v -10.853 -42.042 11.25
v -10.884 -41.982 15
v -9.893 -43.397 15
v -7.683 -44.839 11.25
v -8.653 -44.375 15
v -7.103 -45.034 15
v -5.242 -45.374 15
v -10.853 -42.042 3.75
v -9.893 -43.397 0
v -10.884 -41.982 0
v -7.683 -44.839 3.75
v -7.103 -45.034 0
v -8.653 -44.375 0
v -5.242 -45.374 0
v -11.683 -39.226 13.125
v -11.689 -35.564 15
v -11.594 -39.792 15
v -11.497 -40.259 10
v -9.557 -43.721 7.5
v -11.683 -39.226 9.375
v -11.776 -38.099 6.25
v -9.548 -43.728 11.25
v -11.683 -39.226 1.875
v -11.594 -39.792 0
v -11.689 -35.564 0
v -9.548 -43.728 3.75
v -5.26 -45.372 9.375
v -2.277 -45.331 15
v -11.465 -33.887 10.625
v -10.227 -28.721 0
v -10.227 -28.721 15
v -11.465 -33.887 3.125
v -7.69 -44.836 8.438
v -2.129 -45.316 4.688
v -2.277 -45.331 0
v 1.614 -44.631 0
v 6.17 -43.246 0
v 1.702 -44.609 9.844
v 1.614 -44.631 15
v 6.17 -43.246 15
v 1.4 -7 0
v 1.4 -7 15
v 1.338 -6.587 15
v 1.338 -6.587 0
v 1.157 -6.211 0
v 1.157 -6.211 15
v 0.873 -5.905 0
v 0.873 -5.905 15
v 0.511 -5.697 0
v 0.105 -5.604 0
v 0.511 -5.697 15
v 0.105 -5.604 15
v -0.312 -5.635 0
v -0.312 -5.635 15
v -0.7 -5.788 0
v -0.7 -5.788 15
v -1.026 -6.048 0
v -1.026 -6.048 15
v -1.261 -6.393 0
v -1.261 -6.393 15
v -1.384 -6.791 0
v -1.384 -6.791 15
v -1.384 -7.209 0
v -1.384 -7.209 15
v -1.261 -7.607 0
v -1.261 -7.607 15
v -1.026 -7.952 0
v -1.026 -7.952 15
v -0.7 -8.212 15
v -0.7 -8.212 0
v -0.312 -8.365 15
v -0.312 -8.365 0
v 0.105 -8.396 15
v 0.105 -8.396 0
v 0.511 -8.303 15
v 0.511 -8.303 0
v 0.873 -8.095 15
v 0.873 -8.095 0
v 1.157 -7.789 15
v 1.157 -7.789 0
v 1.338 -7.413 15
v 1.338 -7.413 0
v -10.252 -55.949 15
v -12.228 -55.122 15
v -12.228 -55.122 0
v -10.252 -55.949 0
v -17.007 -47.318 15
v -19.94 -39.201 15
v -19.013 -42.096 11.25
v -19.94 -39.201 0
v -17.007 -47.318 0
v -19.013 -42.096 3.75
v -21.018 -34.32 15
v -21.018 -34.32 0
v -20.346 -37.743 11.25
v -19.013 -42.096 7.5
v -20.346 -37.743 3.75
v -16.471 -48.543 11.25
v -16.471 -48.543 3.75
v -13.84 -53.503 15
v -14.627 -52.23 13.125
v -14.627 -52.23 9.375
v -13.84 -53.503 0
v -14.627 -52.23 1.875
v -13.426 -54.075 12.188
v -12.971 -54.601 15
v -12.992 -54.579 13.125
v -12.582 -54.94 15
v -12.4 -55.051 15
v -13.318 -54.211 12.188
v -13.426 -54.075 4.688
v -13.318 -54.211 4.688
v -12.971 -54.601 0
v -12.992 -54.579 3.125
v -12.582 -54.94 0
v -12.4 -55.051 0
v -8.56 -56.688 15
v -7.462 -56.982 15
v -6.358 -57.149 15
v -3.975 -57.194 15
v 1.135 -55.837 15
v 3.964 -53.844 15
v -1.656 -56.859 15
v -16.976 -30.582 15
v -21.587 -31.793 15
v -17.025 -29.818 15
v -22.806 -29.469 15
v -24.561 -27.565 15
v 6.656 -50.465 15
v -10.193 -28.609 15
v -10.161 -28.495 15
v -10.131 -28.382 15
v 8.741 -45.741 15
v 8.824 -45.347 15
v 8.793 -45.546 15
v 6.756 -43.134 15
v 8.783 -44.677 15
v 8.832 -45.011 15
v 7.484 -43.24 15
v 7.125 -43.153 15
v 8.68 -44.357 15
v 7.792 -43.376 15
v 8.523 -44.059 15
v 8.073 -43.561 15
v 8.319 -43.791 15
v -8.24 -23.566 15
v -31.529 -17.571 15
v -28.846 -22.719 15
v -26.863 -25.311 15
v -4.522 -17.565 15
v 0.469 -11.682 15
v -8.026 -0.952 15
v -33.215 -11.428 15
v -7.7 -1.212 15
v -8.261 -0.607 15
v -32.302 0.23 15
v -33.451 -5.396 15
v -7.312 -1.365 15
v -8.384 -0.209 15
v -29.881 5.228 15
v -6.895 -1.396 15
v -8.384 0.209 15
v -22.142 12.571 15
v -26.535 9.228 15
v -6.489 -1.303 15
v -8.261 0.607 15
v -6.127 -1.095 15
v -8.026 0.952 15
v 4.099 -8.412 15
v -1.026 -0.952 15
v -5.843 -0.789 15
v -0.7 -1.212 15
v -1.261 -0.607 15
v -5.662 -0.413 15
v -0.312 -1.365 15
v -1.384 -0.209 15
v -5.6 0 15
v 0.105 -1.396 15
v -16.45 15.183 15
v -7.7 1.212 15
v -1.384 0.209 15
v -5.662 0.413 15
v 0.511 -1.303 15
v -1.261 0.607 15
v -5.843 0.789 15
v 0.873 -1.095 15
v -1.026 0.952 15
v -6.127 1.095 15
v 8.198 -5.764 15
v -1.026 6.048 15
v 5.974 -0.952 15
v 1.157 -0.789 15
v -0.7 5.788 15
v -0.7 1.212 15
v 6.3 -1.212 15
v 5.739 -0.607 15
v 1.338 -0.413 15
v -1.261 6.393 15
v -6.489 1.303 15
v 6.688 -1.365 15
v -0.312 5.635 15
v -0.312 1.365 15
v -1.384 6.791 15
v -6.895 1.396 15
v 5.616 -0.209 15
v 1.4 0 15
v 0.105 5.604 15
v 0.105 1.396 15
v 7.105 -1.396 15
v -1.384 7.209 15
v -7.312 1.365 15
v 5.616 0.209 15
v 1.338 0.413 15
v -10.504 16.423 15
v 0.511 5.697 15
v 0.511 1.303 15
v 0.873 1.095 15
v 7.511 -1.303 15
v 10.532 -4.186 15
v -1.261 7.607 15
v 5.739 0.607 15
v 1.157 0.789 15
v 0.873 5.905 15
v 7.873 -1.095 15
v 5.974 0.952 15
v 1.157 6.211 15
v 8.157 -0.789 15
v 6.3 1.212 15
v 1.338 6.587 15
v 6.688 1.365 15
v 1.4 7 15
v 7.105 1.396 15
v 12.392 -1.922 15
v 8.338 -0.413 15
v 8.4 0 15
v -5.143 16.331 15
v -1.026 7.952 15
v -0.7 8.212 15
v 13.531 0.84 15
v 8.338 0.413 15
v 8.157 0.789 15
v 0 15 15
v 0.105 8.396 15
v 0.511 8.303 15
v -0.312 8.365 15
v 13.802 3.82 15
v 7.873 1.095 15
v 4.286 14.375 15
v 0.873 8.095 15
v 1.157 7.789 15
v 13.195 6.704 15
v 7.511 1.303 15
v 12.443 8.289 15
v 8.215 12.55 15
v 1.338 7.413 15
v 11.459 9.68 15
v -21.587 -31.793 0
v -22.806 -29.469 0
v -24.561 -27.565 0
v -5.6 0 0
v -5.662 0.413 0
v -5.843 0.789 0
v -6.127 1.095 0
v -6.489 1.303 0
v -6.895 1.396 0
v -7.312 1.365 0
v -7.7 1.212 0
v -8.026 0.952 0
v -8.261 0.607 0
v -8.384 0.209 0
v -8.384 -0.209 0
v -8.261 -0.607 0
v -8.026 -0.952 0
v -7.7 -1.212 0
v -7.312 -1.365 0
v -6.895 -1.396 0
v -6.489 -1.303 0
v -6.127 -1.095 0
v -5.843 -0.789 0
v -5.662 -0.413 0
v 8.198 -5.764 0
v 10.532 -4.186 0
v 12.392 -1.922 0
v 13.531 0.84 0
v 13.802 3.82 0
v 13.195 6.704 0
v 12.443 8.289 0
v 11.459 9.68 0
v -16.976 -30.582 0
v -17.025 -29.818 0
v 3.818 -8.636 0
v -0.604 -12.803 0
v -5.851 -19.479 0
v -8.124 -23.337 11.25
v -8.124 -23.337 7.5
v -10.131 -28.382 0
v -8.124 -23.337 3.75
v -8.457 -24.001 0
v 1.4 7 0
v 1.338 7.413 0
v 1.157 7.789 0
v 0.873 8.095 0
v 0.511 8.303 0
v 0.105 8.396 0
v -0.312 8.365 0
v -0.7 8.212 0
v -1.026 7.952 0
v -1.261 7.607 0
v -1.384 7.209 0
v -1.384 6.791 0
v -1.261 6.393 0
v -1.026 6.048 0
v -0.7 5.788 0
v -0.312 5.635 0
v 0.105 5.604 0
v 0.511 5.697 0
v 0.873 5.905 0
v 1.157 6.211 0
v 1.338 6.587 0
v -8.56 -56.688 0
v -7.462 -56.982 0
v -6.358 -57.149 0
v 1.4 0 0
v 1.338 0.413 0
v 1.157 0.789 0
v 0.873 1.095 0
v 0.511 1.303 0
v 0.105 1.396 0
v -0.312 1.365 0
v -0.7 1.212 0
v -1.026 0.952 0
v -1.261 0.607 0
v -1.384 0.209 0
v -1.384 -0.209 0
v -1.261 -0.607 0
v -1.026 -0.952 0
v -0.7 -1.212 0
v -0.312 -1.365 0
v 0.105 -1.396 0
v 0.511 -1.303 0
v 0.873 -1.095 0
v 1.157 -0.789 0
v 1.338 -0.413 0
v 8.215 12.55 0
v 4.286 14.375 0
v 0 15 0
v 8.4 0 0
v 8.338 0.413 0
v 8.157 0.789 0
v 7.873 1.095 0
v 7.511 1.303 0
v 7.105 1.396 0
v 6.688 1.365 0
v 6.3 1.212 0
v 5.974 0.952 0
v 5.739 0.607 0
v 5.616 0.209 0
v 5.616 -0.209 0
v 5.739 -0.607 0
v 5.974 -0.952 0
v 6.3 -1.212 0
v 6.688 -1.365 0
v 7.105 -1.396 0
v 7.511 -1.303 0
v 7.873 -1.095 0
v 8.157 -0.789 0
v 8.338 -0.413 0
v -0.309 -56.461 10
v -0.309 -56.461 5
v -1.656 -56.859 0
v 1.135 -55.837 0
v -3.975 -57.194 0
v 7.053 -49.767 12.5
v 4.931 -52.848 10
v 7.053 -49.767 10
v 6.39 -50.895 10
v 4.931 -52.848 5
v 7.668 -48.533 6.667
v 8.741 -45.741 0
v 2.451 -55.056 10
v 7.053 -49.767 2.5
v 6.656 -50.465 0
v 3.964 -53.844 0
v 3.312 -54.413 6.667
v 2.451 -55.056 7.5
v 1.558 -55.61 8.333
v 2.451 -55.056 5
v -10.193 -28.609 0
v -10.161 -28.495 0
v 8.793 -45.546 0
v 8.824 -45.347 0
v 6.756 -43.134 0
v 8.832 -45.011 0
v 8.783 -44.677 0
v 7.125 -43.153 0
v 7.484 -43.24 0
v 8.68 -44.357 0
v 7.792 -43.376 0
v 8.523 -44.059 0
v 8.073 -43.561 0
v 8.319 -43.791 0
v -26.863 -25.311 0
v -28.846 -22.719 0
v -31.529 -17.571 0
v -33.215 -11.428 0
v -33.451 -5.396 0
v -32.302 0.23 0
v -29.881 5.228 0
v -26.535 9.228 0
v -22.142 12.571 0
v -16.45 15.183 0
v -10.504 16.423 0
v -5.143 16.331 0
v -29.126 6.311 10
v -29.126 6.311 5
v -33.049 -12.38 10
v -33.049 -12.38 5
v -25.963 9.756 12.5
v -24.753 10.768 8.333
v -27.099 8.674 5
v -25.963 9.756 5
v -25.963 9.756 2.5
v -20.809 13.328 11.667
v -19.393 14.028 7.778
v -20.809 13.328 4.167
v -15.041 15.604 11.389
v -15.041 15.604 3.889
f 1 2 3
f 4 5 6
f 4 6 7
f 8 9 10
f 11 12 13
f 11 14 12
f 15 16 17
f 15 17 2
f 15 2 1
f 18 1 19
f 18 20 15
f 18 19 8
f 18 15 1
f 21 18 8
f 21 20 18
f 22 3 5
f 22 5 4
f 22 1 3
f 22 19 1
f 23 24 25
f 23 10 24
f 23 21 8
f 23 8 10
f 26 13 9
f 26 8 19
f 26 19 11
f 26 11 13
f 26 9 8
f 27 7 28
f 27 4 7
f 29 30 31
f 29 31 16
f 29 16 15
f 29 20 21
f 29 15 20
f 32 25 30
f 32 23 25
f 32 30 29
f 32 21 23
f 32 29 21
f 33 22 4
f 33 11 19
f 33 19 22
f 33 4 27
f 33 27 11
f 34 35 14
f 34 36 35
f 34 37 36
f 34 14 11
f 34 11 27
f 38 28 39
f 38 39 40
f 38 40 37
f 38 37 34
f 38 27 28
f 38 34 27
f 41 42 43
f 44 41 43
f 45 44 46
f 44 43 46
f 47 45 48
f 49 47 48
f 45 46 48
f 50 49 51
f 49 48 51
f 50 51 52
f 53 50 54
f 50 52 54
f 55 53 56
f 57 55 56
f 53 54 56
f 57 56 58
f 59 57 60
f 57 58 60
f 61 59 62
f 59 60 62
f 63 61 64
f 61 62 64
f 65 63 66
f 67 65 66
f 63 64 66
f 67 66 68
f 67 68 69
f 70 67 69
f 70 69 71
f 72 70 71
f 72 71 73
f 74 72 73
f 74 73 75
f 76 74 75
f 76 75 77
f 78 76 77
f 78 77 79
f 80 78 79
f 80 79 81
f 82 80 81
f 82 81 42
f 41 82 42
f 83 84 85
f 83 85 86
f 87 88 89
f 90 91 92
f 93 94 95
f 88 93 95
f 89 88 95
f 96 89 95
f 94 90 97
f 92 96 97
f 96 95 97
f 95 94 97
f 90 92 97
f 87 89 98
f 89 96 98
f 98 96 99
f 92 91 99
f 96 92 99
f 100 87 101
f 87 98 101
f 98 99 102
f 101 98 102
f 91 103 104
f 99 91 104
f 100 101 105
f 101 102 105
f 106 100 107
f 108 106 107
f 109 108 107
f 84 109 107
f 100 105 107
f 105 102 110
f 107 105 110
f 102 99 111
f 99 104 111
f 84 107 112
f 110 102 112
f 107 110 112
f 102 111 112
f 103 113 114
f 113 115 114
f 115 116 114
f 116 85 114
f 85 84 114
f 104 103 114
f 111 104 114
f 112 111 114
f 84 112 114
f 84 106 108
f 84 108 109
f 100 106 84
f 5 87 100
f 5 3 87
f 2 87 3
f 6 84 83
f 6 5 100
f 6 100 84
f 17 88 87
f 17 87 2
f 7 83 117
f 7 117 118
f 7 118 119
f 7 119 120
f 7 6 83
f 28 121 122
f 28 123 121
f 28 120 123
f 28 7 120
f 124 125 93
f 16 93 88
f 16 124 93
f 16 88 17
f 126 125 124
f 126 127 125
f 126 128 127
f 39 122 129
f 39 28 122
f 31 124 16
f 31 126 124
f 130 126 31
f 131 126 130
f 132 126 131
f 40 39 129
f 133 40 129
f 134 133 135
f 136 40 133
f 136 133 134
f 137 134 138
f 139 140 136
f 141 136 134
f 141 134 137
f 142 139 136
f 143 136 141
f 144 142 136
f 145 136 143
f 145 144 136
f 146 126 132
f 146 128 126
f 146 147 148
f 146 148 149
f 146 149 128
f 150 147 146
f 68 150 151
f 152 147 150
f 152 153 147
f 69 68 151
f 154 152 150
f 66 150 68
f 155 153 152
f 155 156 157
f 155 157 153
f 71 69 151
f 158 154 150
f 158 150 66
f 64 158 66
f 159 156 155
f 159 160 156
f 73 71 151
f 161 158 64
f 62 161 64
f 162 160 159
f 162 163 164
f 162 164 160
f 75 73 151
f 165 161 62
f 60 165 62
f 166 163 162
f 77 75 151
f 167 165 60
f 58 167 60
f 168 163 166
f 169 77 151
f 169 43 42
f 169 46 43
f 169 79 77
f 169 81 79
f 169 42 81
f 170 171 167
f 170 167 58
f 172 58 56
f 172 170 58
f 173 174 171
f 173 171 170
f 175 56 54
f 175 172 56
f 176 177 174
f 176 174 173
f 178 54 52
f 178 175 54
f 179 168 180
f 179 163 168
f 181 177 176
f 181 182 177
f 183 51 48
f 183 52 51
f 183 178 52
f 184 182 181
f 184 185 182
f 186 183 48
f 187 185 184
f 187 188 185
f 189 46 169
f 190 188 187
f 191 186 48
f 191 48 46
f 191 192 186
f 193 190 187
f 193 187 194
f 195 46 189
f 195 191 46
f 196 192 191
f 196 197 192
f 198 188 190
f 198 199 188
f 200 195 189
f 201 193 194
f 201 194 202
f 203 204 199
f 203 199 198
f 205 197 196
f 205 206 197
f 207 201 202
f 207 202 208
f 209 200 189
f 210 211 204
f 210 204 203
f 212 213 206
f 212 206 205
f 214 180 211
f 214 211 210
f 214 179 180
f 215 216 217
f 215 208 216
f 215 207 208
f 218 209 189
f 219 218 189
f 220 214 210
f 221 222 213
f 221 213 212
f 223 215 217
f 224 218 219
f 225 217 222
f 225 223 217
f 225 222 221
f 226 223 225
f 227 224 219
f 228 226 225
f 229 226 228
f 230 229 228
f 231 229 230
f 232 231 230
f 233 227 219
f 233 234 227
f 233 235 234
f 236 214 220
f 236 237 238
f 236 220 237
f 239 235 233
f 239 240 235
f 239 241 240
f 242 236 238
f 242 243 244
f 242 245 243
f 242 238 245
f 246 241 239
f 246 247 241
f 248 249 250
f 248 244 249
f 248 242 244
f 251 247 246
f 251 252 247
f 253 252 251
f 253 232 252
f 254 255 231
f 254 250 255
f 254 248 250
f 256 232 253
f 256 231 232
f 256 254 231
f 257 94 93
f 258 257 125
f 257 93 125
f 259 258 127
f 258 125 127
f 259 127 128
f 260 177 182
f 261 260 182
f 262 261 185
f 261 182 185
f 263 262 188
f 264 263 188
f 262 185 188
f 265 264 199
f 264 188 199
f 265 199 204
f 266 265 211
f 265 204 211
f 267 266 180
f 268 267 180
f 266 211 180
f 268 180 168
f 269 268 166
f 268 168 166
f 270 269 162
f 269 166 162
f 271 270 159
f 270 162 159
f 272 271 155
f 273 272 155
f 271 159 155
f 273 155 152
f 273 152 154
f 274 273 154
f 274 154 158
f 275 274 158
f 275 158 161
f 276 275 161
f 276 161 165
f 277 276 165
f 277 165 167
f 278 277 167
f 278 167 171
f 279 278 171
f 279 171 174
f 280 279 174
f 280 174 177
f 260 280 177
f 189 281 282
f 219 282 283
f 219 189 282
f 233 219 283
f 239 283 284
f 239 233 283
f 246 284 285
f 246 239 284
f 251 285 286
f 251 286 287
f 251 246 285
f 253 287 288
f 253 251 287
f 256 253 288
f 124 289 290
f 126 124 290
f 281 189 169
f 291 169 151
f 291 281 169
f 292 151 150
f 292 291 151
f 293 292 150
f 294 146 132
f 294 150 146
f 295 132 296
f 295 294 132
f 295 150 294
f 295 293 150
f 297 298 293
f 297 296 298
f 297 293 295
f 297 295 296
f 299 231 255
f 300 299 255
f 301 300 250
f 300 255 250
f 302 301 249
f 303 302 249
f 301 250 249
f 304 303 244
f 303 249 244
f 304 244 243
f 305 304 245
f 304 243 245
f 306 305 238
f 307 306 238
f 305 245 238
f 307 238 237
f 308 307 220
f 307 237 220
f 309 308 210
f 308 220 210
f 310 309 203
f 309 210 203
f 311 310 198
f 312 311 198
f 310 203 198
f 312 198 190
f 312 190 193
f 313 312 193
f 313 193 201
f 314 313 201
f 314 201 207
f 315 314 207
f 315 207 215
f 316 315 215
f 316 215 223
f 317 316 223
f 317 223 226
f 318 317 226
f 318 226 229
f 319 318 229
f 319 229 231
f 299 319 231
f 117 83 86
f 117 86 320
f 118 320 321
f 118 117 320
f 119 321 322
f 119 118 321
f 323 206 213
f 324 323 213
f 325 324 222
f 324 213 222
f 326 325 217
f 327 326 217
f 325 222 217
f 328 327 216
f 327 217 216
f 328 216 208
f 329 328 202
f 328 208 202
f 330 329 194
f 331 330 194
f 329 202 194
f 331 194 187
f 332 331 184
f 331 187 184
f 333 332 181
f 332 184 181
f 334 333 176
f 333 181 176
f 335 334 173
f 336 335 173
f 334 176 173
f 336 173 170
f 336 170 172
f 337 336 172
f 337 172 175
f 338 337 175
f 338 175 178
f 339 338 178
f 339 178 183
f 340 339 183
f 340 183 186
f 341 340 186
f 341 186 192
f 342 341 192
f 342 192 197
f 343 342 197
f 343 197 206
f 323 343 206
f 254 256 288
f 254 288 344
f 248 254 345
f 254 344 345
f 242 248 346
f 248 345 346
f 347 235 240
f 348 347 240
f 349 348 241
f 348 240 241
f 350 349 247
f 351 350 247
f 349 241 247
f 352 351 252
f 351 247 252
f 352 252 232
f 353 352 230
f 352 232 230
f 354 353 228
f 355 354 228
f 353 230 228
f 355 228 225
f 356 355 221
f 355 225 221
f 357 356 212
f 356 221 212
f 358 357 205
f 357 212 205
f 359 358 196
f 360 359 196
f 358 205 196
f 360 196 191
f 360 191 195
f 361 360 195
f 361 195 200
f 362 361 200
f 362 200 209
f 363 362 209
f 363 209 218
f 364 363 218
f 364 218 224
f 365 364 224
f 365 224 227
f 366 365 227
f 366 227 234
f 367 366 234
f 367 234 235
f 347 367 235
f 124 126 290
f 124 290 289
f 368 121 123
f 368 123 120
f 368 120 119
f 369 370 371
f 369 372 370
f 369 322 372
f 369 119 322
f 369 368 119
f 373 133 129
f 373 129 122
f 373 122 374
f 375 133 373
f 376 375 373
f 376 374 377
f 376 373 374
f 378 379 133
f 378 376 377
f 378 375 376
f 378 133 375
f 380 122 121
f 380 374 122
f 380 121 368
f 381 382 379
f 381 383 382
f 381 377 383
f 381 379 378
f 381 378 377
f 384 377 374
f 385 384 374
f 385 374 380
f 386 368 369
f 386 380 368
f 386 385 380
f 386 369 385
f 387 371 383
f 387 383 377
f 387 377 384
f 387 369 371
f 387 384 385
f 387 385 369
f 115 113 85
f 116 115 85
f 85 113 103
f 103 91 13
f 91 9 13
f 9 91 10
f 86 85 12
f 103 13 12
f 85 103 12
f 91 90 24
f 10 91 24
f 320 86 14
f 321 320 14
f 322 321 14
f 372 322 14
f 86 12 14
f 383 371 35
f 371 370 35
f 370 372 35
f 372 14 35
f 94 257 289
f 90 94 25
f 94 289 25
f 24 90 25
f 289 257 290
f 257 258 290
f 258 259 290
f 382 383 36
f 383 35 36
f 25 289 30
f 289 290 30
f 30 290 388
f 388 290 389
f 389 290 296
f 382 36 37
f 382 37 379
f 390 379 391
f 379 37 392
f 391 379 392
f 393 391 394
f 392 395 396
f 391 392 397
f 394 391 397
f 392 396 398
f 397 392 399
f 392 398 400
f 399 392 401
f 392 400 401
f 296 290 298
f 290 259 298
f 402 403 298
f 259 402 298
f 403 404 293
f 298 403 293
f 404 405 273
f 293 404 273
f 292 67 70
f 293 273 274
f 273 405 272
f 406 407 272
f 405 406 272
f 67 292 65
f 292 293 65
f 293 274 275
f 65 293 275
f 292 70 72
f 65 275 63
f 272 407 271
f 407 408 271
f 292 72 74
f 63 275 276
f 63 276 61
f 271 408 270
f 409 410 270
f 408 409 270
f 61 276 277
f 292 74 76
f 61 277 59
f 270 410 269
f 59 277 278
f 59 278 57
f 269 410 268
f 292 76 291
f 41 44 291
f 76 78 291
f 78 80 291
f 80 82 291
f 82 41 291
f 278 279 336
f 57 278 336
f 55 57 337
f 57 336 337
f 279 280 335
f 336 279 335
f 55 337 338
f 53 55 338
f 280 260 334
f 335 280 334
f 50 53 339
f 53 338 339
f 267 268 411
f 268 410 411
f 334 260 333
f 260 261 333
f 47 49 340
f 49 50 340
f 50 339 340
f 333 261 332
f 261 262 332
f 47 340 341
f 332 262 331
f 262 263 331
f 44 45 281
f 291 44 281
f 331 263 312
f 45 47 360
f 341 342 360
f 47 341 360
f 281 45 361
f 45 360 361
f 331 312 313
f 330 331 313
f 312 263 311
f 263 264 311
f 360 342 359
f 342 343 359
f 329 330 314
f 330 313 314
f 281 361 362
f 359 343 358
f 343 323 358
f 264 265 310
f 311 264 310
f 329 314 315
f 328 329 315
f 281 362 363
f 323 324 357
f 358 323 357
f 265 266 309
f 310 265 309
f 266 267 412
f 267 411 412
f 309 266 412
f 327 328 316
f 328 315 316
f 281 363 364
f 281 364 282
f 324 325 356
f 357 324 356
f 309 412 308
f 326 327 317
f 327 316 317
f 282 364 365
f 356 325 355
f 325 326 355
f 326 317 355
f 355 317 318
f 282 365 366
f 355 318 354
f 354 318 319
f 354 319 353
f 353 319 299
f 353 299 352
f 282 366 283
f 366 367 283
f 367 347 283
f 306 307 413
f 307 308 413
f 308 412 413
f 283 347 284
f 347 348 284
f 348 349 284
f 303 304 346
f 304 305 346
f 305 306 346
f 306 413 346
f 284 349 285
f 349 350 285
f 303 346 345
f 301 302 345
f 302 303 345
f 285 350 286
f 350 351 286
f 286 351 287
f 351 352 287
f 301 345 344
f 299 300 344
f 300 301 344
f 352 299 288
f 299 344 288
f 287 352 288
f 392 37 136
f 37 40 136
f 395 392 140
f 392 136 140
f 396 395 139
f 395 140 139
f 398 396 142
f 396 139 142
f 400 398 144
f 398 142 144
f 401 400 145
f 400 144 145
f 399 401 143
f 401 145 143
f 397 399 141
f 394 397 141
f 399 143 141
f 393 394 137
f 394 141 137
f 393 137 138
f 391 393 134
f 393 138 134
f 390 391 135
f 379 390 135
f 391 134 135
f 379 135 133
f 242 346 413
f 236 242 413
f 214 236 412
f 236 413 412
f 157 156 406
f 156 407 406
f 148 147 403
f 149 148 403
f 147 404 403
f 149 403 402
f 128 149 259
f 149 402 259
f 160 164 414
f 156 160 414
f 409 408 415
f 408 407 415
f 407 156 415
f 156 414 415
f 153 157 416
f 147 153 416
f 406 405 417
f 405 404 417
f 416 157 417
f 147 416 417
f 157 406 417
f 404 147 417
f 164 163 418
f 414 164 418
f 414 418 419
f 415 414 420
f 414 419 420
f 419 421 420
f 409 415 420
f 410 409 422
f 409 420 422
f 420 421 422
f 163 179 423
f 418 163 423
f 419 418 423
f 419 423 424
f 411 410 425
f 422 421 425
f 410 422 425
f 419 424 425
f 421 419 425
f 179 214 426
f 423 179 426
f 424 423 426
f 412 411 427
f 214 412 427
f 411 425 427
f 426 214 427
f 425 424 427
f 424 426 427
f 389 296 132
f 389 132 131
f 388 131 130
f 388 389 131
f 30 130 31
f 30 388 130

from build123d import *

# Parameters (mm, degrees)
EXTRUDE_1_DEPTH     = 15
SKETCH_3_R          = 1.4
CUT_EXTRUDE_2_DEPTH = 45.491091955
CUT_EXTRUDE_3_DEPTH = 45.491091955
EXTRUDE_2_DEPTH     = 15
FILLET_1_R          = 2
FILLET_START        = -1
FILLET_2_DEPTH      = 17
FILLET_3_R          = 10
CUT_EXTRUDE_4_DEPTH = 20
CUT_EXTRUDE_5_DEPTH = 20
EXTRUDE_3_DEPTH     = 15
FILLET_10_DEPTH     = 17
FILLET_10_2_DEPTH   = 15
FILLET_11_R         = 5
FILLET_12_R         = 10
EXTRUDE_4_DEPTH     = 15
FILLET_13_R         = 10


with BuildPart() as part:
    # 草图1 → 凸台-拉伸1 (new body)
    with BuildSketch(Plane.XY):
        with BuildLine():
            ThreePointArc((14.095389312, -5.13030215), (12.287280664, 8.603646545), (0, 15))
            add(Edge.make_bspline(
                [(0, 15), (-0.174596768, 14.999999319), (-0.436611581, 14.999693042), (-0.786186323, 14.998643785), (-1.048915847, 14.997519085), (-1.312216235, 14.99603471), (-1.576228693, 14.994161918), (-1.84109342, 14.991865662), (-2.106949414, 14.989104591), (-2.373934268, 14.985831089), (-2.642183971, 14.981991319), (-2.911832716, 14.977525266), (-3.1830127, 14.972366794), (-3.455853932, 14.966443701), (-3.730484039, 14.959677782), (-4.007028071, 14.9519849), (-4.285608318, 14.943275054), (-4.566344116, 14.933452466), (-4.849351664, 14.922415656), (-5.134743838, 14.910057537), (-5.422630012, 14.896265505), (-5.713115875, 14.880921543), (-6.006303259, 14.863902316), (-6.302289959, 14.84507929), (-6.601169567, 14.824318836), (-6.903031299, 14.801482354), (-7.207959833, 14.776426392), (-7.516035146, 14.749002775), (-7.827332351, 14.719058736), (-8.141921549, 14.686437053), (-8.459867669, 14.650976187), (-8.781230323, 14.612510428), (-9.106063662, 14.570870045), (-9.434416233, 14.525881438), (-9.766330843, 14.477367292), (-10.101844426, 14.425146744), (-10.440987913, 14.36903554), (-10.783786108, 14.30884621), (-11.130257567, 14.244388236), (-11.480414483, 14.175468229), (-11.834262574, 14.101890107), (-12.191800976, 14.023455277), (-12.553022141, 13.939962822), (-12.917911738, 13.851209688), (-13.286448564, 13.756990875), (-13.658604451, 13.657099633), (-14.03434419, 13.551327657), (-14.413625446, 13.439465288), (-14.796398691, 13.321301714), (-15.182607133, 13.196625177), (-15.572186657, 13.065223175), (-15.965065767, 12.926882676), (-16.361165533, 12.781390325), (-16.760399548, 12.62853266), (-17.162673883, 12.468096321), (-17.567887059, 12.299868276), (-17.975930009, 12.12363602), (-18.386686074, 11.939187837), (-18.800030904, 11.746312879), (-19.21583277, 11.544801919), (-19.63395132, 11.334445536), (-20.054242271, 11.115042096), (-20.476539575, 10.886368472), (-20.900723293, 10.648292485), (-21.326461435, 10.400346233), (-21.753514654, 10.143757392), (-22.178049863, 9.87535726), (-22.595959424, 9.592299141), (-23.006858872, 9.296248411), (-23.410215858, 8.987163154), (-23.805723663, 8.665361009), (-24.19302422, 8.331073979), (-24.571782966, 7.984568061), (-24.94166894, 7.626110759), (-25.302360391, 7.255979562), (-25.65354351, 6.874459377), (-25.994913004, 6.481842935), (-26.326172169, 6.078430394), (-26.647033089, 5.664529144), (-26.957216795, 5.240453567), (-27.256453426, 4.80652479), (-27.544482381, 4.363070443), (-27.82105247, 3.910424411), (-28.085922052, 3.448926584), (-28.338859169, 2.978922599), (-28.579641679, 2.500763586), (-28.808057373, 2.014805906), (-29.023904095, 1.521410888), (-29.226989847, 1.020944566), (-29.417132895, 0.513777409), (-29.594161862, 0.000284053), (-29.757915818, -0.519156969), (-29.908244365, -1.044163505), (-30.045007708, -1.574350056), (-30.168076728, -2.109328051), (-30.277333041, -2.648706129), (-30.372669056, -3.192090415), (-30.453988019, -3.739084801), (-30.521204062, -4.289291227), (-30.574242228, -4.842309963), (-30.613038507, -5.39773989), (-30.637539851, -5.955178784), (-30.647704191, -6.514223598), (-30.643500444, -7.074470745), (-30.624908509, -7.63551638), (-30.591919266, -8.196956684), (-30.544534557, -8.758388145), (-30.48276717, -9.319407838), (-30.406640805, -9.879613709), (-30.316190047, -10.438604851), (-30.21146032, -10.995981785), (-30.092507839, -11.551346736), (-29.95939956, -12.104303912), (-29.812213112, -12.654459772), (-29.651036733, -13.201423307), (-29.475969194, -13.744806302), (-29.287119719, -14.284223615), (-29.084607895, -14.819293432), (-28.868563581, -15.349637541), (-28.639126801, -15.874881588), (-28.396447646, -16.394655341), (-28.140686152, -16.908592941), (-27.872012186, -17.416333158), (-27.590605319, -17.917519643), (-27.296654692, -18.411801174), (-26.990358881, -18.898831896), (-26.671925755, -19.378271573), (-26.341572303, -19.849785794), (-25.885480421, -20.467504768), (-25.526267712, -20.917866263), (-25.279466623, -21.21199112)],
                knots=[0, 0, 0, 0, 0.008983592, 0.013481544, 0.017986876, 0.022502032, 0.027029448, 0.031571543, 0.036130722, 0.040709366, 0.045309838, 0.049934477, 0.054585593, 0.059265472, 0.063976367, 0.068720504, 0.073500073, 0.078317234, 0.083174111, 0.088072793, 0.093015336, 0.098003759, 0.103040044, 0.108126138, 0.113263955, 0.118455369, 0.123702222, 0.129006319, 0.134369433, 0.139793302, 0.145279632, 0.150830096, 0.156446337, 0.162129965, 0.167882565, 0.173705688, 0.179600863, 0.185569587, 0.191613334, 0.197733555, 0.203931674, 0.210209093, 0.216567194, 0.223007337, 0.229530862, 0.236139089, 0.242833322, 0.249614847, 0.256484933, 0.263444834, 0.270495789, 0.277639024, 0.284875752, 0.292207171, 0.299634469, 0.307158825, 0.314781404, 0.322503362, 0.330325849, 0.338250002, 0.346276954, 0.354407827, 0.362643738, 0.370985797, 0.379435108, 0.387992769, 0.396619209, 0.405274739, 0.413959558, 0.422673829, 0.431417677, 0.440191194, 0.448994436, 0.457827427, 0.466690157, 0.475582587, 0.484504647, 0.493456237, 0.50243723, 0.511447469, 0.520486775, 0.529554938, 0.538651727, 0.547776885, 0.556930133, 0.566111169, 0.575319669, 0.584555288, 0.593817663, 0.603106409, 0.612421123, 0.621761385, 0.631126755, 0.64051678, 0.649930987, 0.659368891, 0.66882999, 0.678313767, 0.687819694, 0.697347228, 0.706895812, 0.71646488, 0.726053851, 0.735662137, 0.745289135, 0.754934234, 0.764596814, 0.774276244, 0.783971886, 0.793683092, 0.803409207, 0.813149569, 0.822903507, 0.832670344, 0.8424494, 0.852239983, 0.862041401, 0.871852953, 0.881673937, 0.891503642, 0.901341356, 0.911186363, 0.921037943, 0.930895373, 0.940757928, 0.95062488, 0.960495499, 0.970369054, 0.980244811, 1, 1, 1, 1], degree=3))
            add(Edge.make_bspline(
                [(-25.279466623, -21.21199112), (-25.03266702, -21.506118015), (-24.650058643, -21.936850324), (-24.116326131, -22.48889957), (-23.704647777, -22.89139552), (-23.281933222, -23.282038607), (-22.848561661, -23.660506241), (-22.404923763, -24.026490317), (-21.951421131, -24.379697722), (-21.48846567, -24.719850743), (-21.016478952, -25.046687464), (-20.535891561, -25.359962134), (-20.047142425, -25.659445508), (-19.550678137, -25.944925156), (-19.04695226, -26.216205747), (-18.536424623, -26.4731093), (-18.019560603, -26.715475403), (-17.496830406, -26.943161412), (-16.968708336, -27.156042604), (-16.435672059, -27.354012309), (-15.898201862, -27.536982008), (-15.35677991, -27.704881402), (-14.811889501, -27.857658441), (-14.264014323, -27.995279333), (-13.713637708, -28.117728512), (-13.161241887, -28.225008578), (-12.607307258, -28.317140209), (-12.052311649, -28.394162034), (-11.496729594, -28.456130483), (-10.941031611, -28.5031196), (-10.385683496, -28.535220833), (-9.831145623, -28.552542784), (-9.277872252, -28.555210939), (-8.726310862, -28.543367367), (-8.176901485, -28.517170386), (-7.630076062, -28.476794208), (-7.086257816, -28.422428554), (-6.545860639, -28.354278239), (-6.009288499, -28.272562744), (-5.476934872, -28.177515748), (-4.949182183, -28.069384646), (-4.426401286, -27.948430045), (-3.908950946, -27.814925234), (-3.397177365, -27.669155633), (-2.891413716, -27.511418228), (-2.391979716, -27.342020982), (-1.899181211, -27.161282232), (-1.413309805, -26.969530066), (-0.934642496, -26.767101692), (-0.463441361, -26.554342786), (4.6748e-05, -26.331606829), (0.455590466, -26.099254437), (0.902974156, -25.857652676), (1.341998114, -25.607174371), (1.77247875, -25.348197408), (2.194248731, -25.081104026), (2.607157097, -24.806280109), (3.011069352, -24.524114474), (3.405867507, -24.234998154), (3.791450116, -23.939323681), (4.167732256, -23.637484373), (4.534645494, -23.329873622), (4.892137816, -23.016884179), (5.240173528, -22.698907455), (5.578733117, -22.376332816), (5.907813101, -22.049546899), (6.22742583, -21.71893292), (6.537599266, -21.384870008), (6.838376738, -21.047732541), (7.129816662, -20.707889495), (7.411992235, -20.365703811), (7.684991105, -20.021531772), (7.948915008, -19.675722401), (8.20387939, -19.32861687), (8.450012994, -18.980547932), (8.687457427, -18.631839373), (8.916366703, -18.282805481), (9.136906768, -17.933750534), (9.349254998, -17.58496832), (9.553599678, -17.236741672), (9.750139466, -16.889342026), (9.939082834, -16.543029011), (10.120647493, -16.198050057), (10.295059808, -15.854640037), (10.462554187, -15.513020927), (10.623372469, -15.173401503), (10.777763289, -14.835977057), (10.925981441, -14.50092915), (11.068287227, -14.168425389), (11.204945795, -13.838619231), (11.336226478, -13.511649827), (11.462402118, -13.187641886), (11.583748391, -12.866705573), (11.70054313, -12.548936438), (11.813065642, -12.234415378), (11.921596028, -11.923208621), (12.026414502, -11.615367753), (12.127800711, -11.310929767), (12.226033064, -11.009917143), (12.321388061, -10.712337965), (12.414139626, -10.418186058), (12.504558455, -10.127441167), (12.592911364, -9.840069152), (12.679460654, -9.556022225), (12.76446348, -9.275239204), (12.848171238, -8.997645806), (12.93082896, -8.723154954), (13.01267473, -8.451667126), (13.093939106, -8.183070715), (13.174844564, -7.917242422), (13.255604965, -7.654047671), (13.336425025, -7.393341046), (13.417499824, -7.134966749), (13.49901432, -6.87875908), (13.581142893, -6.624542932), (13.664048917, -6.372134315), (13.747884322, -6.121340875), (13.832789331, -5.871962488), (13.947500586, -5.541332702), (14.035654827, -5.294414261), (14.095389312, -5.13030215)],
                knots=[0, 0, 0, 0, 0.021270399, 0.031903677, 0.042534645, 0.053162531, 0.063786554, 0.074405932, 0.085019874, 0.095627584, 0.106228257, 0.116821079, 0.127405228, 0.137979868, 0.148544155, 0.15909723, 0.169638222, 0.180166248, 0.190680407, 0.201179787, 0.211663457, 0.222130473, 0.232579872, 0.243010676, 0.253421887, 0.263812492, 0.27418146, 0.284527741, 0.294850266, 0.30514795, 0.315419689, 0.32566436, 0.335880824, 0.346067921, 0.356224476, 0.366349296, 0.376441173, 0.386498878, 0.396521172, 0.406506796, 0.416454478, 0.426362934, 0.436230863, 0.446056956, 0.45583989, 0.465578331, 0.475270938, 0.48491636, 0.49451324, 0.504060215, 0.513555916, 0.522998973, 0.532388013, 0.541721663, 0.550998551, 0.560217309, 0.569376572, 0.578474983, 0.587511192, 0.596483859, 0.605391658, 0.614233274, 0.623007411, 0.631712789, 0.640348151, 0.64891226, 0.657403907, 0.66582191, 0.674165115, 0.682432404, 0.690622694, 0.69873494, 0.706768137, 0.714721328, 0.7225936, 0.730384093, 0.738092, 0.745716573, 0.753257123, 0.760713027, 0.76808373, 0.775368751, 0.782567685, 0.789680206, 0.796706075, 0.803645143, 0.810497353, 0.81726275, 0.823941479, 0.830533798, 0.837040075, 0.8434608, 0.849796585, 0.856048172, 0.86221644, 0.868302406, 0.874307234, 0.880232236, 0.886078882, 0.891848803, 0.897543794, 0.903165817, 0.908717009, 0.914199683, 0.919616328, 0.924969613, 0.930262387, 0.935497677, 0.94067869, 0.945808804, 0.950891568, 0.955930696, 0.960930056, 0.965893662, 0.970825666, 0.975730339, 0.980612064, 0.985475315, 0.990324642, 1, 1, 1, 1], degree=3))
        make_face()
    extrude(amount=EXTRUDE_1_DEPTH)

    # 草图3 → 切除-拉伸2 (cut, through all)
    with BuildSketch(Plane.XY.offset(15)):
        Circle(SKETCH_3_R)
        with Locations((7, 0)):
            Circle(SKETCH_3_R)
        with Locations((0, -7)):
            Circle(SKETCH_3_R)
        with Locations((-7, 0)):
            Circle(SKETCH_3_R)
        with Locations((0, 7)):
            Circle(SKETCH_3_R)
    extrude(amount=-CUT_EXTRUDE_2_DEPTH, mode=Mode.SUBTRACT)

    # 草图4 → 切除-拉伸3 (cut, through all)
    with BuildSketch(Plane(origin=(0, 0, 0), x_dir=(-1, 0, 0), z_dir=(0, 0, -1))):
        with BuildLine():
            add(Edge.make_bspline(
                [(-14.095389312, -5.13030215), (-8.477553271, -2.33145367), (8.442499566, -18.762509722), (12.755936915, -38.178736967), (-14.541457389, -65.503061248), (-22.968832669, -9.551118862), (-14.095389312, -5.13030215)],
                knots=[0, 0, 0, 0, 0.26968314, 0.394975947, 0.574032057, 1, 1, 1, 1], degree=3))
        make_face()
    extrude(amount=-CUT_EXTRUDE_3_DEPTH, mode=Mode.SUBTRACT)

    # 草图5 → 凸台-拉伸2 (add)
    with BuildSketch(Plane(origin=(0, 0, 0), x_dir=(-1, 0, 0), z_dir=(0, 0, -1))):
        with BuildLine():
            add(Edge.make_bspline(
                [(10.171874722, -28.541189548), (17.683846291, -53.151232988), (-9.707997946, -41.889793219)],
                knots=[0, 0, 0, 1, 1, 1], degree=2))
            add(Edge.make_bspline(
                [(-9.707997946, -41.889793219), (-2.463001099, -79.763097153), (48.013392254, -36.744634011), (17.334003198, -27.007773326)],
                knots=[0, 0, 0, 0, 1, 1, 1, 1], degree=3))
            add(Edge.make_bspline(
                [(17.334003198, -27.007773326), (16.861768371, -27.20105705), (16.027625054, -27.506859328), (14.814842143, -27.864848675), (13.716286363, -28.124971876), (12.609659956, -28.324417343), (11.498796153, -28.463423353), (10.685046818, -28.521336018), (10.242958884, -28.538751516), (10.171874722, -28.541189548)],
                knots=[0.183395931, 0.183395931, 0.183395931, 0.183395931, 0.211663457, 0.232579872, 0.253421887, 0.27418146, 0.294850266, 0.315419689, 0.319359962, 0.319359962, 0.319359962, 0.319359962], degree=3))
        make_face()
    extrude(amount=-EXTRUDE_2_DEPTH)

    # 圆角1
    fillet_1_edges = [part.edges().sort_by_distance(p)[0] for p in [
        (9.707997946, -41.889793219, 7.5),
    ]]
    fillet(fillet_1_edges, radius=FILLET_1_R)

    # 圆角2: read off the stored shape, not the designer's step
    # 圆角2 outline → 圆角2 (cut)
    with BuildSketch(Plane.XY.offset(FILLET_START)):
        with BuildLine():
            add(Edge.make_bspline(
                [(-10.171874722, -28.541189548), (-10.158393322, -28.488116713), (-10.144653776, -28.435026787), (-10.130657706, -28.381918891)],
                knots=[0.681495055, 0.681495055, 0.681495055, 0.681495055, 0.683012829, 0.683012829, 0.683012829, 0.683012829], degree=3))
            ThreePointArc((-10.130657706, -28.381918891), (-10.17712039, -28.552114075), (-10.226578366, -28.721463095))
            add(Edge.make_bspline(
                [(-10.171874722, -28.541189548), (-10.199461913, -28.631568216), (-10.226578366, -28.721463095)],
                knots=[0, 0, 0, 0.00367243, 0.00367243, 0.00367243], degree=2))
        make_face()
    extrude(amount=FILLET_2_DEPTH, mode=Mode.SUBTRACT)

    # 圆角3
    fillet_3_edges = [part.edges().sort_by_distance(p)[0] for p in [
        (14.095389312, -5.13030215, 7.5),
    ]]
    fillet(fillet_3_edges, radius=FILLET_3_R)

    # 草图6 → 切除-拉伸4 (cut)
    with BuildSketch(Plane(origin=(0, 0, 0), x_dir=(-1, 0, 0), z_dir=(0, 0, -1))):
        with BuildLine():
            ThreePointArc((17.334004909, -28.838535505), (17.371905963, -27.923154694), (17.334004909, -27.007773884))
            add(Edge.make_bspline(
                [(13.73055902, -54.95243101), (25.941820402, -48.919462484), (34.820440249, -32.557525348), (17.334004909, -27.007773884)],
                knots=[0.430026556, 0.430026556, 0.430026556, 0.430026556, 0.999999963, 0.999999963, 0.999999963, 0.999999963], degree=3))
            add(Edge.make_bspline(
                [(17.334004909, -28.838535505), (28.052279378, -41.223912757), (13.73055902, -54.95243101)],
                knots=[0, 0, 0, 1, 1, 1], degree=2))
        make_face()
    extrude(amount=-CUT_EXTRUDE_4_DEPTH, mode=Mode.SUBTRACT)

    # 草图7 → 切除-拉伸5 (cut)
    with BuildSketch(Plane(origin=(0, 0, 0), x_dir=(-1, 0, 0), z_dir=(0, 0, -1))):
        with BuildLine():
            add(Edge.make_bspline(
                [(17.334004909, -28.838535505), (16.357819767, -30.417478072), (18.89407609, -39.049467108), (16.627660878, -45.968198336), (10.616921472, -60.726222639), (45.520515414, -46.002345599), (19.509062719, -25.320461714), (17.334004909, -28.838535505)],
                knots=[0, 0, 0, 0, 0.142925417, 0.277103606, 0.387123085, 0.681544994, 1, 1, 1, 1], degree=3))
        make_face()
    extrude(amount=-CUT_EXTRUDE_5_DEPTH, mode=Mode.SUBTRACT)

    # 草图8 → 凸台-拉伸3 (add)
    with BuildSketch(Plane(origin=(0, 0, 0), x_dir=(-1, 0, 0), z_dir=(0, 0, -1))):
        with BuildLine():
            Line((16.976273943, -30.581588683), (17.024745895, -29.81773752))
            add(Edge.make_bspline(
                [(17.334004909, -28.838535505), (17.175593703, -29.094759642), (17.077337103, -29.426647448), (17.024745895, -29.81773752)],
                knots=[0, 0, 0, 0, 0.023193334, 0.023193334, 0.023193334, 0.023193334], degree=3))
            ThreePointArc((17.334004909, -28.838535505), (17.371905963, -27.923154692), (17.334004909, -27.00777388))
            add(Edge.make_bspline(
                [(25.279466623, -21.21199112), (25.03266702, -21.506118015), (24.522565573, -22.08037929), (23.710347977, -22.89714981), (22.853982967, -23.66650411), (21.956551734, -24.385919792), (21.021309056, -25.053113105), (20.051664575, -25.666053342), (19.051161351, -26.222973885), (18.141767865, -26.664887828), (17.563839778, -26.913704036), (17.334004909, -27.00777388)],
                knots=[0, 0, 0, 0, 0.021270399, 0.042534645, 0.063786554, 0.085019874, 0.106228257, 0.127405228, 0.148544155, 0.169638222, 0.183395905, 0.183395905, 0.183395905, 0.183395905], degree=3))
            add(Edge.make_bspline(
                [(0, 15), (0.262014797, 14.999998978), (0.699343525, 14.999238628), (1.401538909, 14.995786143), (2.109980659, 14.989734033), (2.915961101, 14.978337798), (3.830049802, 14.958681331), (4.763807339, 14.928169831), (5.720653756, 14.882540631), (6.609655012, 14.826186274), (7.419163121, 14.759812824), (8.145673453, 14.687272778), (8.785203026, 14.613390937), (9.438606806, 14.526799364), (10.106250398, 14.426094011), (10.788405492, 14.309813904), (11.485245709, 14.176446723), (12.196842822, 14.024434295), (12.923163255, 13.852178372), (13.66406489, 13.658046601), (14.419294178, 13.440378683), (15.322614234, 13.155138445), (16.377663761, 12.783459779), (17.443972468, 12.357968513), (18.393385732, 11.939741847), (19.080016401, 11.613131439), (19.63395132, 11.334445536), (20.054242271, 11.115042096), (20.476539575, 10.886368472), (20.900723293, 10.648292485), (21.326461435, 10.400346233), (21.753514654, 10.143757392), (22.178049863, 9.87535726), (22.595959424, 9.592299141), (23.006858872, 9.296248411), (23.410215858, 8.987163154), (23.938454649, 8.557365376), (24.578113739, 7.988760142), (25.308901303, 7.259788657), (26.00163562, 6.485268624), (26.653910974, 5.667573262), (27.263461632, 4.809190379), (27.828167604, 3.912715665), (28.346059328, 2.980844637), (28.815322092, 2.016364607), (29.234300033, 1.022146413), (29.60149972, 0.001136003), (29.915593327, -1.043654147), (30.175421367, -2.109153728), (30.37999501, -3.192243409), (30.528497954, -4.289763734), (30.620287863, -5.398524083), (30.654897363, -6.515311681), (30.6320346, -7.636900631), (30.551583347, -8.76006095), (30.413602677, -9.881567589), (30.218326197, -10.998209417), (29.966160838, -12.106798143), (29.657685215, -13.20417716), (29.293647561, -14.287230295), (28.874963232, -15.35289043), (28.402711797, -16.398147996), (27.878133718, -17.420059297), (27.302626627, -18.415754665), (26.677741219, -19.382446423), (26.005176442, -20.317436362), (25.526267712, -20.917866263), (25.279466623, -21.21199112)],
                knots=[0, 0, 0, 0, 0.013481544, 0.022502032, 0.036130722, 0.049934477, 0.063976367, 0.083174111, 0.098003759, 0.113263955, 0.129006319, 0.139793302, 0.150830096, 0.162129965, 0.173705688, 0.185569587, 0.197733555, 0.210209093, 0.223007337, 0.236139089, 0.249614847, 0.263444834, 0.284875752, 0.307158825, 0.322503362, 0.338250002, 0.346276954, 0.354407827, 0.362643738, 0.370985797, 0.379435108, 0.387992769, 0.396619209, 0.405274739, 0.413959558, 0.422673829, 0.431417677, 0.448994436, 0.466690157, 0.484504647, 0.50243723, 0.520486775, 0.538651727, 0.556930133, 0.575319669, 0.593817663, 0.612421123, 0.631126755, 0.649930987, 0.66882999, 0.687819694, 0.706895812, 0.726053851, 0.745289135, 0.764596814, 0.783971886, 0.803409207, 0.822903507, 0.8424494, 0.862041401, 0.881673937, 0.901341356, 0.921037943, 0.940757928, 0.960495499, 0.980244811, 1, 1, 1, 1], degree=3))
            add(Edge.make_bspline(
                [(0, 15), (9.955491464, 18.994366054), (30.470804679, 12.348663999), (35.897228225, -12.360904323), (27.290369493, -26.992176206), (20.618940745, -30.087622849)],
                knots=[0, 0, 0, 0, 0.427134128, 0.682739763, 0.947421443, 0.947421443, 0.947421443, 0.947421443], degree=3))
            add(Edge.make_bspline(
                [(20.618940745, -30.087622849), (22.084451222, -35.206607817), (15.938636074, -51.775642121), (16.976273943, -30.581588683)],
                knots=[0, 0, 0, 0, 1, 1, 1, 1], degree=3))
        make_face()
    extrude(amount=-EXTRUDE_3_DEPTH)

    # 圆角10: read off the stored shape, not the designer's step
    # 圆角10 outline → 圆角10 (cut)
    with BuildSketch(Plane.XY.offset(FILLET_START)):
        with BuildLine():
            add(Edge.make_bspline(
                [(-14.453784771, -54.244039702), (-14.100526804, -54.5977872), (-13.73055902, -54.95243101)],
                knots=[0.974167364, 0.974167364, 0.974167364, 1, 1, 1], degree=2))
            ThreePointArc((-13.73055902, -54.95243101), (-14.127196959, -53.770289977), (-14.373636144, -52.547977868))
            add(Edge.make_bspline(
                [(-14.373636144, -52.547977868), (-14.283642901, -53.202857107), (-14.293684823, -53.783741225), (-14.453784771, -54.244039702)],
                knots=[0.355170291, 0.355170291, 0.355170291, 0.355170291, 0.387123085, 0.387123085, 0.387123085, 0.387123085], degree=3))
        make_face()
    extrude(amount=FILLET_10_DEPTH, mode=Mode.SUBTRACT)

    # Fillet 10 2 outline → Fillet 10 2 (add)
    with BuildSketch(Plane.XY):
        with BuildLine():
            ThreePointArc((-18.74589655, -40.537425822), (-17.877770434, -42.02328087), (-17.277247378, -43.635974343))
            add(Edge.make_bspline(
                [(-17.798712345, -41.01989795), (-17.696310486, -41.915313353), (-17.516700944, -42.771824813), (-17.277247378, -43.635974343)],
                knots=[0.182137805, 0.182137805, 0.182137805, 0.182137805, 0.223707572, 0.223707572, 0.223707572, 0.223707572], degree=3))
            add(Edge.make_bspline(
                [(-17.798712345, -41.01989795), (-18.085894593, -41.209228549), (-18.413933309, -41.007454549), (-18.74589655, -40.537425822)],
                knots=[0.335471124, 0.335471124, 0.335471124, 0.335471124, 0.47112469, 0.47112469, 0.47112469, 0.47112469], degree=3))
        make_face()
    extrude(amount=FILLET_10_2_DEPTH)

    # 圆角11
    fillet_11_edges = [part.edges().sort_by_distance(p)[0] for p in [
        (-20.618940745, -30.087622849, 7.5),
    ]]
    fillet(fillet_11_edges, radius=FILLET_11_R)

    # 圆角12
    fillet_12_edges = [part.edges().sort_by_distance(p)[0] for p in [
        (-13.73055902, -54.95243101, 7.5),
    ]]
    fillet(fillet_12_edges, radius=FILLET_12_R)

    # 草图9 → 凸台-拉伸4 (add)
    with BuildSketch(Plane(origin=(0, 0, 0), x_dir=(-1, 0, 0), z_dir=(0, 0, -1))):
        with BuildLine():
            add(Edge.make_bspline(
                [(20.833410383, -32.649873448), (21.508384286, -33.538007339), (19.021507662, -44.08533859), (10.815064374, -60.889845226), (10.868488682, -42.868316155), (19.719134403, -31.183703784), (20.833410383, -32.649873448)],
                knots=[0, 0, 0, 0, 0.194450208, 0.494404678, 0.678993225, 1, 1, 1, 1], degree=3))
        make_face()
    extrude(amount=-EXTRUDE_4_DEPTH)

    # 圆角13
    fillet_13_edges = [part.edges().sort_by_distance(p)[0] for p in [
        (-20.833410383, -32.649873448, 7.5),
        (-11.677276884, -54.995385558, 7.5),
    ]]
    fillet(fillet_13_edges, radius=FILLET_13_R)


solid = part.part
